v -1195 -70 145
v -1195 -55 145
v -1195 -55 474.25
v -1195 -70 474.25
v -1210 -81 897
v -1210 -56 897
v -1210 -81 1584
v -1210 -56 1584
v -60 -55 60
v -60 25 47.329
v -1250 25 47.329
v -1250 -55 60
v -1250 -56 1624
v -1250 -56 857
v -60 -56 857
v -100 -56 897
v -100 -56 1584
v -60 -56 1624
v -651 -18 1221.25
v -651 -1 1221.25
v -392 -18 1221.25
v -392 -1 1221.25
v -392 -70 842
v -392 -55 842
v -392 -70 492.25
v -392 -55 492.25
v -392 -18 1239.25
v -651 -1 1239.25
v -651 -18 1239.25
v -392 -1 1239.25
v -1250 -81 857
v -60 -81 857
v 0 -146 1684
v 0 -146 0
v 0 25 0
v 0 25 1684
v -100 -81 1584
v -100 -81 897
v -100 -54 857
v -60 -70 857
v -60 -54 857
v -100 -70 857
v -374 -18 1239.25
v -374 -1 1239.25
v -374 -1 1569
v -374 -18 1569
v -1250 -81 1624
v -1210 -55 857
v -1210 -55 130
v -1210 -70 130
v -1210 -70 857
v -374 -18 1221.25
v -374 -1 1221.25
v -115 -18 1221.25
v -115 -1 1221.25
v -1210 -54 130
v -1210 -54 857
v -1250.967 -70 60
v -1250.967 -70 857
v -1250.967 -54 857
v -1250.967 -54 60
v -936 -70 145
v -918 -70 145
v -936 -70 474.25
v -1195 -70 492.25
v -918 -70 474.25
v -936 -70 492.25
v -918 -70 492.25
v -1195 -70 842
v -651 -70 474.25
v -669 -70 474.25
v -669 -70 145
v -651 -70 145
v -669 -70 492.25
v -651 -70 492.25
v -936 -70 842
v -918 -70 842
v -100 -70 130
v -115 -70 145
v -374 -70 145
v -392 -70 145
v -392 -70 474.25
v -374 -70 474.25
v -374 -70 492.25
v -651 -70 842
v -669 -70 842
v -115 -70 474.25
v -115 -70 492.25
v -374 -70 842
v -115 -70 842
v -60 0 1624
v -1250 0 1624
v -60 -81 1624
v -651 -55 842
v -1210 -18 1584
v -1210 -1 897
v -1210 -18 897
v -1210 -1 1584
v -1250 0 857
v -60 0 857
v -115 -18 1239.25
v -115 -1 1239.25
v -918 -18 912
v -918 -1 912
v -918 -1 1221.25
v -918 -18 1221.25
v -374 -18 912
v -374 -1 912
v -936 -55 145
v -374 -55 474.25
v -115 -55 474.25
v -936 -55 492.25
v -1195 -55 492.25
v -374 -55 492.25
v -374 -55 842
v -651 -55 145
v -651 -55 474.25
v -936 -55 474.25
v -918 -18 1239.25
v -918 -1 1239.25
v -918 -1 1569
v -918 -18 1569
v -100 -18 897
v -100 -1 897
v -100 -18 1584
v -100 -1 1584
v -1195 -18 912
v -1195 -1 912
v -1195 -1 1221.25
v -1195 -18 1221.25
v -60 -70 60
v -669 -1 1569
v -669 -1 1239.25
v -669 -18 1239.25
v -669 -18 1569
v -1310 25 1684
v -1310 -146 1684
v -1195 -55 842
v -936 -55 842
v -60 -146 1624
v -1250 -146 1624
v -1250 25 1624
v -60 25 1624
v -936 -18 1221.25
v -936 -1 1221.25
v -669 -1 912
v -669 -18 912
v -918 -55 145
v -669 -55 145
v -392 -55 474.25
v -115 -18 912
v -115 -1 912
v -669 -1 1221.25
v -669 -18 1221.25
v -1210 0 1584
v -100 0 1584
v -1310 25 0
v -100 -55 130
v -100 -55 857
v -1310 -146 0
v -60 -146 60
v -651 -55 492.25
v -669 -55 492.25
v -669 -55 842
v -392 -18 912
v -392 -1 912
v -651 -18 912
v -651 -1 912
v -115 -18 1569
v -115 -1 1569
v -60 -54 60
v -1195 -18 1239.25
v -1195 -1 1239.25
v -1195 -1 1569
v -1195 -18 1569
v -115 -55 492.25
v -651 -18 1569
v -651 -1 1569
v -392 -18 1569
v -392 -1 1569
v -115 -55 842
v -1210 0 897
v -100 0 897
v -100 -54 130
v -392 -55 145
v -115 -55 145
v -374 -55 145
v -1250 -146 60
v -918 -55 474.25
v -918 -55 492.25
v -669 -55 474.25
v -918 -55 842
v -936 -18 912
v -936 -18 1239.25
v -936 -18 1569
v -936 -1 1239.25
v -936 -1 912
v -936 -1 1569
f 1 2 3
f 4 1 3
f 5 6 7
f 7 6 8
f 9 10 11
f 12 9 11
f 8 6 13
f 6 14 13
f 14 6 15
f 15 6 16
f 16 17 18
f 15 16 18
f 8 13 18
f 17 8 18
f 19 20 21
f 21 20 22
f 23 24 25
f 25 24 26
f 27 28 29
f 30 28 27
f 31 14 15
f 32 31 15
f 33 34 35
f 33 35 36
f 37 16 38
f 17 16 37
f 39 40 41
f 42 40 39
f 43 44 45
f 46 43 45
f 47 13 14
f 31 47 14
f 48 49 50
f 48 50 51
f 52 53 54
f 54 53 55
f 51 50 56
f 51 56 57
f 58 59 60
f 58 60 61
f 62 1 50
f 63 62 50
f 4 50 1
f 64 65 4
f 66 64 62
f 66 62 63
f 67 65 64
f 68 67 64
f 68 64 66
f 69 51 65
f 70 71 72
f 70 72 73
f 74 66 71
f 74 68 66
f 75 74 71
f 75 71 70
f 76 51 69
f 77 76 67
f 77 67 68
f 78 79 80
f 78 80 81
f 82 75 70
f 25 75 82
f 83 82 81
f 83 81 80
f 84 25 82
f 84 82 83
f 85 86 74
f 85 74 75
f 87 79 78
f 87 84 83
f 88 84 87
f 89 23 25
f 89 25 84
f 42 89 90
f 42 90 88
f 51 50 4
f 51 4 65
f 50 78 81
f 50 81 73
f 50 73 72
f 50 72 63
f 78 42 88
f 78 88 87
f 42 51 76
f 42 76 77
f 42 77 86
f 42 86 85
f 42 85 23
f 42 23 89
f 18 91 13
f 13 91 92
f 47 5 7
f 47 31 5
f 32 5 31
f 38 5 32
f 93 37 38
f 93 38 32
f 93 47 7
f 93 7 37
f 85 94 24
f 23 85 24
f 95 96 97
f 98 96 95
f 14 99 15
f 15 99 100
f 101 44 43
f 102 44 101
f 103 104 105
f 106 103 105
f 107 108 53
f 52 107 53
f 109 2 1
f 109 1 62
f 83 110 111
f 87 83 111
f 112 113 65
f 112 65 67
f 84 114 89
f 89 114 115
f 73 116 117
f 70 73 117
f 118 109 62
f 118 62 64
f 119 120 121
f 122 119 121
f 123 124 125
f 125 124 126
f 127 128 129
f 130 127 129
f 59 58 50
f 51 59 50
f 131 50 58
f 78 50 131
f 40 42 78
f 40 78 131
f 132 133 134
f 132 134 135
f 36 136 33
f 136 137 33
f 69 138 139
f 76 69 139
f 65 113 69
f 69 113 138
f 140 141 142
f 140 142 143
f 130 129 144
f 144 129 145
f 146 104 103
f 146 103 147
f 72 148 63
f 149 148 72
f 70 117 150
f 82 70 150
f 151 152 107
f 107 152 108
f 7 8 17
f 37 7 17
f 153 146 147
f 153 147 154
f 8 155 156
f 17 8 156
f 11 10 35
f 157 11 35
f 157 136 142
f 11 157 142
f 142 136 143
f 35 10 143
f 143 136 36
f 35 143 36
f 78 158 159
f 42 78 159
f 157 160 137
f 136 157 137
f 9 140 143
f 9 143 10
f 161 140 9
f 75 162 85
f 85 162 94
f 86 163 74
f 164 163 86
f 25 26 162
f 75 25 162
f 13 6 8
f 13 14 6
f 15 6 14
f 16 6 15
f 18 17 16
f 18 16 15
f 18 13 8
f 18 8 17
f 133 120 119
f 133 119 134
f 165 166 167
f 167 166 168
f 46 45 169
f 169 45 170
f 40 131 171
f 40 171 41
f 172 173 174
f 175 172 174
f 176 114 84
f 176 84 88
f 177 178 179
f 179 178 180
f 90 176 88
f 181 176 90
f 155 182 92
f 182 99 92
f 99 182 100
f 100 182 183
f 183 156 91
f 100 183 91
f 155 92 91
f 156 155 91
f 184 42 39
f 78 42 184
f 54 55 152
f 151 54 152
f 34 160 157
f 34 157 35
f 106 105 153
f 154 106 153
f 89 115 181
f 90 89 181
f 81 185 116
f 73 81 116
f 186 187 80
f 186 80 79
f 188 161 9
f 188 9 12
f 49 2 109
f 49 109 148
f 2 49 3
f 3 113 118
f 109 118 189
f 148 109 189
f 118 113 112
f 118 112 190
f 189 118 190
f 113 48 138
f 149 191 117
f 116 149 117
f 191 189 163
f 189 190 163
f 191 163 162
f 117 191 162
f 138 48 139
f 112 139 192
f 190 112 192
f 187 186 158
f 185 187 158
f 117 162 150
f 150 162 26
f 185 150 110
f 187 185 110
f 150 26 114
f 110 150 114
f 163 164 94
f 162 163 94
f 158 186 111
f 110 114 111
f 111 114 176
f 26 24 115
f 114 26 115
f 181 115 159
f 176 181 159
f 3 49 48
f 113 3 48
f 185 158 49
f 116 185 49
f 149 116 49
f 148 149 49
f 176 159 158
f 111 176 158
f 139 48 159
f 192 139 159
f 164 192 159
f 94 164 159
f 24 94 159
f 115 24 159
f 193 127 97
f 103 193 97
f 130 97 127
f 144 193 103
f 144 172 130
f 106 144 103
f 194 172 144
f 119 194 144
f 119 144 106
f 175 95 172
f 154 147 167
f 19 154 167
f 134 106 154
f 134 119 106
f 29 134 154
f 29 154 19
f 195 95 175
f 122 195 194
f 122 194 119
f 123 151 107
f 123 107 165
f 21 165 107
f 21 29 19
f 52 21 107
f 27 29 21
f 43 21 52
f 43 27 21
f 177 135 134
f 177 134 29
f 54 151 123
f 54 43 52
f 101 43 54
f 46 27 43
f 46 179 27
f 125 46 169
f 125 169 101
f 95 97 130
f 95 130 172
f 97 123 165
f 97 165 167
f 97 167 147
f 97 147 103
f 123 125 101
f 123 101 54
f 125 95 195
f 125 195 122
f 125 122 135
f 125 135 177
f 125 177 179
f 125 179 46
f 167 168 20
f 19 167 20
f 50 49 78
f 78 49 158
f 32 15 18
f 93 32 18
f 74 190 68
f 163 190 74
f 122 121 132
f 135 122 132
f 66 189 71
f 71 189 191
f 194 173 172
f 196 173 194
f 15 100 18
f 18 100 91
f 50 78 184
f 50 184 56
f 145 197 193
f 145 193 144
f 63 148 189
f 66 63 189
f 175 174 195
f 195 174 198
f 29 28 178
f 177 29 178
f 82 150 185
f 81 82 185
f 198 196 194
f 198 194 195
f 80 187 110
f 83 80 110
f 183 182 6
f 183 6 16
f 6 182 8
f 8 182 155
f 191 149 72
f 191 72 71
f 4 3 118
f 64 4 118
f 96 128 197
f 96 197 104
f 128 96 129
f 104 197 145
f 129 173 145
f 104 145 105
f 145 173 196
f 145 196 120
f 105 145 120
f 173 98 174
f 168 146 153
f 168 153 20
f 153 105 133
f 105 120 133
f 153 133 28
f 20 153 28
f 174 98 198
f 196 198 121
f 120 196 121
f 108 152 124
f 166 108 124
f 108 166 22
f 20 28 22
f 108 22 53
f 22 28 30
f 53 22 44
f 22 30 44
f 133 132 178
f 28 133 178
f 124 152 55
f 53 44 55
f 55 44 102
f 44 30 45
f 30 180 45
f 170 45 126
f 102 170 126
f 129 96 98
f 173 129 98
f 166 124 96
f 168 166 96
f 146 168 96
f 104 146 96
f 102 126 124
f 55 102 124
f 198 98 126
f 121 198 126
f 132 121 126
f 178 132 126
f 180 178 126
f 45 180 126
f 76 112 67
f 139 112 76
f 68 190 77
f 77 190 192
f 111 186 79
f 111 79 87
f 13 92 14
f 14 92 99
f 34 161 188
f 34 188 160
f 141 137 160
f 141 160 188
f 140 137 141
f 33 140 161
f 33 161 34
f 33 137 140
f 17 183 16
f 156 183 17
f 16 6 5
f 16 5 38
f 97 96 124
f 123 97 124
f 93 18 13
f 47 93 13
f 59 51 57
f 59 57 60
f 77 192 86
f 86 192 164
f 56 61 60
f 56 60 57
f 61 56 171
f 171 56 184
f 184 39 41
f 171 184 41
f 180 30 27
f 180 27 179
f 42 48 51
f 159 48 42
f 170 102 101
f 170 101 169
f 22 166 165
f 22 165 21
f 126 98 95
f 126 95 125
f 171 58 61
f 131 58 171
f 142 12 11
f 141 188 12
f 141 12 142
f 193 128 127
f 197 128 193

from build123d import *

# Parameters (mm, degrees)
F0_W          = 1310
F0_H          = 1684
F1_DEPTH      = 146
F1_DEPTH_BACK = 25
F0_W_2        = 1110
F0_H_2        = 687
F2_DEPTH      = 56
F3_START      = 1
F0_W_3        = 259
F0_H_3        = 309.25
F0_W_4        = 249
F0_H_4        = 329.75
F0_W_5        = 18
F3_DEPTH      = 17
F4_START      = 55
F0_H_5        = 727
F0_H_6        = 329.25
F0_H_7        = 349.75
F4_DEPTH      = 15
F5_SIZE2      = 12.670755226
F5_SIZE       = 80
F6_DEPTH      = 25
F8_DEPTH      = 16


# Not quite as in the source:
# - a feature names something its author has since deleted; it is built from what else it names


with BuildPart() as f1:
    # F0 (on Front) → F1 (new body, two sides)
    with BuildSketch(Plane.XZ) as f1_sk:
        with Locations((-655, 842)):
            Rectangle(F0_W, F0_H)
        Polygon((-1250, 1624), (-60, 1624), (-60, 857), (-60, 60), (-1250, 60), (-1250, 857), align=None, mode=Mode.SUBTRACT)
    extrude(amount=F1_DEPTH)
    extrude(f1_sk.sketch, amount=-F1_DEPTH_BACK)

    # F5
    f5_edges = [f1.edges().sort_by_distance(p)[0] for p in [
        (-655, 25, 60),
    ]]
    f5_side = f1.faces().sort_by_distance((-655, -60.5, 60))[0]
    chamfer(f5_edges, length=F5_SIZE, length2=F5_SIZE2, reference=f5_side)


with BuildPart() as f2:
    # F0 (on Front) → F2 (new body)
    with BuildSketch(Plane.XZ):
        Polygon((-60, 857), (-60, 1624), (-1250, 1624), (-1250, 857), (-1210, 857), (-100, 857), align=None)
        with Locations((-655, 1240.5)):
            Rectangle(F0_W_2, F0_H_2, mode=Mode.SUBTRACT)
    extrude(amount=F2_DEPTH)


with BuildPart() as f3:
    # F0 (on Front) → F3 (new body)
    with BuildSketch(Plane.XZ.offset(F3_START)):
        with Locations((-655, 1240.5)):
            Rectangle(F0_W_2, F0_H_2)
        with Locations((-1065.5, 1066.625)):
            Rectangle(F0_W_3, F0_H_3, mode=Mode.SUBTRACT)
        with Locations((-793.5, 1066.625)):
            Rectangle(F0_W_4, F0_H_3, mode=Mode.SUBTRACT)
        with Locations((-1065.5, 1404.125)):
            Rectangle(F0_W_3, F0_H_4, mode=Mode.SUBTRACT)
        with Locations((-793.5, 1404.125)):
            Rectangle(F0_W_4, F0_H_4, mode=Mode.SUBTRACT)
        Polygon((-374, 1221.25), (-115, 1221.25), (-115, 912), (-374, 912), (-392, 912), (-651, 912), (-651, 1221.25), (-392, 1221.25), align=None, mode=Mode.SUBTRACT)
        with Locations((-521.5, 1404.125)):
            Rectangle(F0_W_3, F0_H_4, mode=Mode.SUBTRACT)
        with Locations((-244.5, 1404.125)):
            Rectangle(F0_W_3, F0_H_4, mode=Mode.SUBTRACT)
        with Locations((-383, 1066.625)):
            Rectangle(F0_W_5, F0_H_3)
    extrude(amount=F3_DEPTH)


with BuildPart() as f4:
    # F0 (on Front) → F4 (new body)
    with BuildSketch(Plane.XZ.offset(F4_START)):
        with Locations((-655, 493.5)):
            Rectangle(F0_W_2, F0_H_5)
        with Locations((-1065.5, 309.625)):
            Rectangle(F0_W_3, F0_H_6, mode=Mode.SUBTRACT)
        with Locations((-793.5, 309.625)):
            Rectangle(F0_W_4, F0_H_6, mode=Mode.SUBTRACT)
        with Locations((-1065.5, 667.125)):
            Rectangle(F0_W_3, F0_H_7, mode=Mode.SUBTRACT)
        with Locations((-793.5, 667.125)):
            Rectangle(F0_W_4, F0_H_7, mode=Mode.SUBTRACT)
        Polygon((-651, 474.25), (-467.1856169297, 474.25), (-392, 474.25), (-392, 145), (-534.5, 145), (-651, 145), align=None, mode=Mode.SUBTRACT)
        with Locations((-244.5, 309.625)):
            Rectangle(F0_W_3, F0_H_6, mode=Mode.SUBTRACT)
        Polygon((-651, 842), (-392, 842), (-392, 492.25), (-463.5055595409, 492.25), (-651, 492.25), align=None, mode=Mode.SUBTRACT)
        with Locations((-244.5, 667.125)):
            Rectangle(F0_W_3, F0_H_7, mode=Mode.SUBTRACT)
    extrude(amount=F4_DEPTH)


with BuildPart() as f6:
    # F6 (new): a face of the model
    f6_faces = [f2.part.faces().sort_by_distance(p)[0] for p in [
        (-74.1576445781, -56, 1240.5),
    ]]
    extrude(f6_faces, amount=F6_DEPTH)


with BuildPart() as f8:
    # F7 (on face) → F8 (new body)
    with BuildSketch(Plane.XZ.offset(70)):
        Polygon((-1210, 857), (-1250.9673437476, 857), (-1250.9673437476, 60), (-60, 60), (-60, 857), (-100, 857), (-100, 130), (-1210, 130), align=None)
    extrude(amount=-F8_DEPTH)


solid = Compound([f1.part, f2.part, f3.part, f4.part, f6.part, f8.part])
